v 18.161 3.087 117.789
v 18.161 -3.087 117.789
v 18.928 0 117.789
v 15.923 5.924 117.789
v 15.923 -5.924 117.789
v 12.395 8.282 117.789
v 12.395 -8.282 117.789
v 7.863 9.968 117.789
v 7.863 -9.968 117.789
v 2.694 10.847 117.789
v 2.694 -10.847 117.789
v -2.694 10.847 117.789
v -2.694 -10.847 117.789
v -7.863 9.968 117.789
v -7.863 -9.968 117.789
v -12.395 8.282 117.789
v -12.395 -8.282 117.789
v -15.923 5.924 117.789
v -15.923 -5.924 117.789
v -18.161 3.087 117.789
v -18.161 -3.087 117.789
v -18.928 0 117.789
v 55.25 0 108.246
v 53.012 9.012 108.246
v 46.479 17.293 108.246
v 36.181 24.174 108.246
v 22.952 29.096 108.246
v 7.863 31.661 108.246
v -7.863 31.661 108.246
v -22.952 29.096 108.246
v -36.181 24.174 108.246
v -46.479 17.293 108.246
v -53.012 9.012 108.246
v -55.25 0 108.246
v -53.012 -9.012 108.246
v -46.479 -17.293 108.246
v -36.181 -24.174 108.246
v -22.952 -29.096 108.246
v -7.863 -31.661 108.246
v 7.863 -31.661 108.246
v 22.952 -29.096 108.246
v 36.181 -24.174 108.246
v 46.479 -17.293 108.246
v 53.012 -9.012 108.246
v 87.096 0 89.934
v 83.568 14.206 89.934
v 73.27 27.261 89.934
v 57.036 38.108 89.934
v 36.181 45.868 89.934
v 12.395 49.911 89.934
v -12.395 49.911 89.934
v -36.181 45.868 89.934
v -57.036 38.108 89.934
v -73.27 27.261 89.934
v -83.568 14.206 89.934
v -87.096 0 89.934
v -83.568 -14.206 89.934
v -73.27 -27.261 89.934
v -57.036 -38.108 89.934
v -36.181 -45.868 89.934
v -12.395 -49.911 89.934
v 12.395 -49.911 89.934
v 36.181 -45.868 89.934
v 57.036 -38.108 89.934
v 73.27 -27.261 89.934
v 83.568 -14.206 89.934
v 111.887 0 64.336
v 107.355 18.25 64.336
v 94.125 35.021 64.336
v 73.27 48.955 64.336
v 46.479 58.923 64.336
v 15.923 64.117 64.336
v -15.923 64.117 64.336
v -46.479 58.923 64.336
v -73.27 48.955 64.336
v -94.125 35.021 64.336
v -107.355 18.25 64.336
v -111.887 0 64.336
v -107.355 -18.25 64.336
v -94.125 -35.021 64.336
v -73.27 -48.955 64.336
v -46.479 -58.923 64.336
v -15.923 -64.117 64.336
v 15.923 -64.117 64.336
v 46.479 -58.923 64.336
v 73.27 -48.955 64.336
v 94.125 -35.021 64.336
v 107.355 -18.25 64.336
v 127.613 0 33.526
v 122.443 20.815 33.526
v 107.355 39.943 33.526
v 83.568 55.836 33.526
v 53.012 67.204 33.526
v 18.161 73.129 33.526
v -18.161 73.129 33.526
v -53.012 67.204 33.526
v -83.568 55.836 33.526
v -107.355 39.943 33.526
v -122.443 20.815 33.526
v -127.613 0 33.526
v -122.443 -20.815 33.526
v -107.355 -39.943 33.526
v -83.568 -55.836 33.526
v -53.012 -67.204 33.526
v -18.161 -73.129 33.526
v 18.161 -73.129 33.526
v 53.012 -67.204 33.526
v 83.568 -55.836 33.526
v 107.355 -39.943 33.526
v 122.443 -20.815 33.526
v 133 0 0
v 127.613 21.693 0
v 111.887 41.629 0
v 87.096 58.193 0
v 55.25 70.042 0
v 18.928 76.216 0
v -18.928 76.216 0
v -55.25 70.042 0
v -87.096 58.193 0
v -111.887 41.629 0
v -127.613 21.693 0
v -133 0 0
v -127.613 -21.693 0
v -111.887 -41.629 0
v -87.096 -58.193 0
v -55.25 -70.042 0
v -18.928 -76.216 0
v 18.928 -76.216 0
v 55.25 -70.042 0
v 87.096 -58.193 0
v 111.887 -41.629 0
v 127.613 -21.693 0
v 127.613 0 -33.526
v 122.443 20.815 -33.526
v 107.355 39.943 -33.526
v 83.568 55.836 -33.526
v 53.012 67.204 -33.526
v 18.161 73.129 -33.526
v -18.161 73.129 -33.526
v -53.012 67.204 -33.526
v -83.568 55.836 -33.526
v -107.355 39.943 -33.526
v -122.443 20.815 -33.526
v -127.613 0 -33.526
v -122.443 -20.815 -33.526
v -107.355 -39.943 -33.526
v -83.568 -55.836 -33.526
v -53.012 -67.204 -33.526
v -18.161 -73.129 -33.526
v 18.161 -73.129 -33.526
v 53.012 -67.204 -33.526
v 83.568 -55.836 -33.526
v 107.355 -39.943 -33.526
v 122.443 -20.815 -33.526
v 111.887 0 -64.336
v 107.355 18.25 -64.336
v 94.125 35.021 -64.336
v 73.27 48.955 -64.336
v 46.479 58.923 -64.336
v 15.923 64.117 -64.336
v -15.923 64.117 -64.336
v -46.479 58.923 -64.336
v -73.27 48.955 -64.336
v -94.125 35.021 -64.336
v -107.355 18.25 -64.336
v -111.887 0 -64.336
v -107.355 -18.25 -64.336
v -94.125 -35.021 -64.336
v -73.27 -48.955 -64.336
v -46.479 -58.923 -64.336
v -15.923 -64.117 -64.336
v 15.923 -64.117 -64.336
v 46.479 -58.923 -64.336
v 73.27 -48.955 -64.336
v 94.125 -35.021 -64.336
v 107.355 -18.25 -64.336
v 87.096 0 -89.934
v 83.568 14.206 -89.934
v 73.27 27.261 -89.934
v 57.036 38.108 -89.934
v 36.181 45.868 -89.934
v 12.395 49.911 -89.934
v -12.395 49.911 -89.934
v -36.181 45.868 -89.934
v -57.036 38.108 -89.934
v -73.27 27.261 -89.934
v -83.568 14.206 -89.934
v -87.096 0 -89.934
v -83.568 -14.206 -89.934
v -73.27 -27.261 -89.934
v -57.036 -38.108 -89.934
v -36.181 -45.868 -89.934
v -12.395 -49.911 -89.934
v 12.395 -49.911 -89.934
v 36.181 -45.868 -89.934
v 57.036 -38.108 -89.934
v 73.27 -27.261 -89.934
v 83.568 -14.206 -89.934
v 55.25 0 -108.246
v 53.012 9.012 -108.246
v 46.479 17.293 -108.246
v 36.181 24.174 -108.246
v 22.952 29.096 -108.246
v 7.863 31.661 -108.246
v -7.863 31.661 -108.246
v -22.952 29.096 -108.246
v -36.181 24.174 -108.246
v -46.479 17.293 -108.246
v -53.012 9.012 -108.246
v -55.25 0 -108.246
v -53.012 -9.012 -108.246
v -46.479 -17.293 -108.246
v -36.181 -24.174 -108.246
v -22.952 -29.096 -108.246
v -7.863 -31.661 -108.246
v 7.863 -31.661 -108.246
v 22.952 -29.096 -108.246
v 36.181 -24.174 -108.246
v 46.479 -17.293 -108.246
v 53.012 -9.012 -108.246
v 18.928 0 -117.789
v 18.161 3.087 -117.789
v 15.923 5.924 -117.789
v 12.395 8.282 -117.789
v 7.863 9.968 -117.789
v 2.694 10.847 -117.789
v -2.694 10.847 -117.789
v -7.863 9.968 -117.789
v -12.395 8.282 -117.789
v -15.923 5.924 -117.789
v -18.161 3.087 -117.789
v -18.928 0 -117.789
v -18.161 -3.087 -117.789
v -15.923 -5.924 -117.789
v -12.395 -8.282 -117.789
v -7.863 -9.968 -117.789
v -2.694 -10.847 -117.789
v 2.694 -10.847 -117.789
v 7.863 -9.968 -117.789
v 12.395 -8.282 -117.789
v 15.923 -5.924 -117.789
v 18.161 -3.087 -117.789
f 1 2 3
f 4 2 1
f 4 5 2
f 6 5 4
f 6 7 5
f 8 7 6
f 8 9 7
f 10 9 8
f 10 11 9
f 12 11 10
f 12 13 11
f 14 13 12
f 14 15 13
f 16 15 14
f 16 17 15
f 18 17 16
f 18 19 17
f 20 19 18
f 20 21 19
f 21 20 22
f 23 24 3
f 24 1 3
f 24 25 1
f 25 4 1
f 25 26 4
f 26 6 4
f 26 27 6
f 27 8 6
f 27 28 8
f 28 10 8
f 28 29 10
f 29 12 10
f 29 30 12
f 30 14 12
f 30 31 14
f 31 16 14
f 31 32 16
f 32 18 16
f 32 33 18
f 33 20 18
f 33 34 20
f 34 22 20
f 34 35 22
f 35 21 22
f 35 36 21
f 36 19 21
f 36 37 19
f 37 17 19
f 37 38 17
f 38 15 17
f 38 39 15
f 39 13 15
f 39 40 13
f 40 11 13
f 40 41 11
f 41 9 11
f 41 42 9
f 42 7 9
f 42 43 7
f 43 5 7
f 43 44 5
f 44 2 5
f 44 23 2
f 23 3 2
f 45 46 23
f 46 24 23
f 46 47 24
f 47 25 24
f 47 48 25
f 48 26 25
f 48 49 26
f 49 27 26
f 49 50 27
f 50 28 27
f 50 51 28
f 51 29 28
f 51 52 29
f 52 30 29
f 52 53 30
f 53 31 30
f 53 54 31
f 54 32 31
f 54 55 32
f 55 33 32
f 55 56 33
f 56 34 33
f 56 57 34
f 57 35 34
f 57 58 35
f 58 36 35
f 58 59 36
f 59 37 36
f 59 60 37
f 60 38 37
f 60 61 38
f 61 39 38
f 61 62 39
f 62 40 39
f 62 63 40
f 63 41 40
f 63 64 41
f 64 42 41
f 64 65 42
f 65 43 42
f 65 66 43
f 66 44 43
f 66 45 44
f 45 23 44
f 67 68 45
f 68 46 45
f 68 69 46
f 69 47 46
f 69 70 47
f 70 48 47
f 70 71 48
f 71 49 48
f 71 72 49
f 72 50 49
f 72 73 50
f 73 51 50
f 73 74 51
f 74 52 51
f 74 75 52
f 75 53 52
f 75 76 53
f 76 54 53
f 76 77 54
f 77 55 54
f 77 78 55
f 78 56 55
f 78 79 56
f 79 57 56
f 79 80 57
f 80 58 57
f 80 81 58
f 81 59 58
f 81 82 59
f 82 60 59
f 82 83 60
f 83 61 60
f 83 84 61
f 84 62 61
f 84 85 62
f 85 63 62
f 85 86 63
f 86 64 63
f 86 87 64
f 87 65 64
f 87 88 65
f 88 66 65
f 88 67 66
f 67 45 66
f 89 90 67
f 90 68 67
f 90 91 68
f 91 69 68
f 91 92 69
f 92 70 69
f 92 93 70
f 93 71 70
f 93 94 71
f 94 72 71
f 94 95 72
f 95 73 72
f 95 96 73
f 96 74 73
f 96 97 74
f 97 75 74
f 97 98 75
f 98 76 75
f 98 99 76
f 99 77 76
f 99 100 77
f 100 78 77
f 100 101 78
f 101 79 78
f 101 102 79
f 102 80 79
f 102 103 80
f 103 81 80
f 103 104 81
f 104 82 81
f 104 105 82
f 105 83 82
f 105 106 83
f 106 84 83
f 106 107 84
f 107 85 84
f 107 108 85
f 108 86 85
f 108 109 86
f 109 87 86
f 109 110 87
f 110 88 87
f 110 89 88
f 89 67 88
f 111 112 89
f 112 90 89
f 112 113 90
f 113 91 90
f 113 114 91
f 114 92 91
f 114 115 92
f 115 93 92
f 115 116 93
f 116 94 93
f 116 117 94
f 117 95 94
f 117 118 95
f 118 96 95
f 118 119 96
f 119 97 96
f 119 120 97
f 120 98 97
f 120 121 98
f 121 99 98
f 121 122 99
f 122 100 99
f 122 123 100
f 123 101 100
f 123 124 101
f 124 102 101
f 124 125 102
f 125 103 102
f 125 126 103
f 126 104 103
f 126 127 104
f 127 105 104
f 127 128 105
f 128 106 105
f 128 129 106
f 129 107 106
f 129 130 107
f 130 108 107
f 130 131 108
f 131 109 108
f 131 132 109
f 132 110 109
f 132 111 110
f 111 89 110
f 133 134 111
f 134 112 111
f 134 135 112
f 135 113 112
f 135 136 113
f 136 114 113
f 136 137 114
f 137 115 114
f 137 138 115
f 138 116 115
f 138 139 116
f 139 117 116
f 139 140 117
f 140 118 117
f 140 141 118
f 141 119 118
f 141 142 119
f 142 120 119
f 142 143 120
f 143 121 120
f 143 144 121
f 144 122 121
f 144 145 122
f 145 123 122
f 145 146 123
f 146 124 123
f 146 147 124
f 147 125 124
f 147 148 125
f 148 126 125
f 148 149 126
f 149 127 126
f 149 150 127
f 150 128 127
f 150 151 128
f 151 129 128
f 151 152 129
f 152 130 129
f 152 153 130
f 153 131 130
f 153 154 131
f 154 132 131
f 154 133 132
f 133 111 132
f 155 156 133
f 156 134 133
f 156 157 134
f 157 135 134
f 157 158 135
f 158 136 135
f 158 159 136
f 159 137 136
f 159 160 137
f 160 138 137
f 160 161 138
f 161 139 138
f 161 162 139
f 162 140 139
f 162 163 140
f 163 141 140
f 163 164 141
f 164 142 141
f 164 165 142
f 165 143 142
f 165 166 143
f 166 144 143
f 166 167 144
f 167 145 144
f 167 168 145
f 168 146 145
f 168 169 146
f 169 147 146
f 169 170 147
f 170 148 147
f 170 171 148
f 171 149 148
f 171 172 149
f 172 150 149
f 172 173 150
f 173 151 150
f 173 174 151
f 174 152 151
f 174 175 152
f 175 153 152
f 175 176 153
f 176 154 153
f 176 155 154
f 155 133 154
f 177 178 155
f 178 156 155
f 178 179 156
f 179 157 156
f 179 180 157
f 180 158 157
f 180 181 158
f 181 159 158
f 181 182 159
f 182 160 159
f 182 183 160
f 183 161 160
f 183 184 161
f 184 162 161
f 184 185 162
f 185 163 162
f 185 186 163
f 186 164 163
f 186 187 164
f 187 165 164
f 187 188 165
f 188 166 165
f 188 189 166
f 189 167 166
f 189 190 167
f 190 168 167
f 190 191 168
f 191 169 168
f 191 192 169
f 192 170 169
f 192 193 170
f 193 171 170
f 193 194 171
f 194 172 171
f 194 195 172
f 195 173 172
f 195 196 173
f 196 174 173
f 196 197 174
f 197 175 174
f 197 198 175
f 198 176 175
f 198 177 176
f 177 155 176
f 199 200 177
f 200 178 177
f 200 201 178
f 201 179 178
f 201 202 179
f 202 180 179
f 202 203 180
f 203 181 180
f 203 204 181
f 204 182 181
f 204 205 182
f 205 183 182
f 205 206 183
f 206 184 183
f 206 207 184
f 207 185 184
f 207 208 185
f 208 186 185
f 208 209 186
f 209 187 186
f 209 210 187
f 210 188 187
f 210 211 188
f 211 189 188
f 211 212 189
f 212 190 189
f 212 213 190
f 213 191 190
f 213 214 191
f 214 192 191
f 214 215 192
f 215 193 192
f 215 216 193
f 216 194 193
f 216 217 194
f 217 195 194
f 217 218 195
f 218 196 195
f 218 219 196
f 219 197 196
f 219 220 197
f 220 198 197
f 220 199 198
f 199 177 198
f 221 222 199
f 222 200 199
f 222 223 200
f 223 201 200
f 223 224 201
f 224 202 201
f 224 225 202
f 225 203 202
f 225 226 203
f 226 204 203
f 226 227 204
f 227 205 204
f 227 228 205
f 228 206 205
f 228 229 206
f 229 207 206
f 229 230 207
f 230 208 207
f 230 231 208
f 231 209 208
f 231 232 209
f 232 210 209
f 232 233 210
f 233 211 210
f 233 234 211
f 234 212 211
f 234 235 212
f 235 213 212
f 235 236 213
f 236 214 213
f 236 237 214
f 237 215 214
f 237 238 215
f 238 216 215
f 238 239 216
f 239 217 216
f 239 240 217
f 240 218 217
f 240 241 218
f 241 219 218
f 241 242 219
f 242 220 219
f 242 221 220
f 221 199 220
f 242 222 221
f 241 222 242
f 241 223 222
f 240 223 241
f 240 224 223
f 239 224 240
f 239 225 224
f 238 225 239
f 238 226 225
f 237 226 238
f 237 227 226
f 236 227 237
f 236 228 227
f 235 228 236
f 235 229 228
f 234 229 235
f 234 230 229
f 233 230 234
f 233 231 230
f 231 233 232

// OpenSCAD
// Generated by SolidPython 1.0.1 on 2020-07-29 00:46:54


scale(v = [19, 11, 17]) {
	sphere(r = 7);
}
/***********************************************
*********      SolidPython code:      **********
************************************************
 
# import packages: SolidPython
from solid import *
from solid.utils import *
from itertools import chain, combinations, permutations


class Resize:

    def __init__(self, scad_file):
        self.scad_file = scad_file
        #self.scad_file = import_scad(scad_file)
        # cone/cylinder param:
        self.r1 = 0
        self.r2 = 0
        self.h = 0
        # rectangular prism param:
        self.w = 0
        self.l = 0
        # ellipse param:
        self.r = 0

    # import OpenScad code (file name corresponds to shape)


    # classify shape + parameters
    def assign(self, param1, param2, param3):
        if self.scad_file == 'cone.scad':
            self.r1 = param1
            self.r2 = param2
            self.h = param3
        elif self.scad_file == 'cylinder.scad':
            self.r1 = param1
            self.r2 = param2
            self.h = param3
        elif self.scad_file == 'rectangularPrism.scad':
            self.h = param1
            self.l = param2
            self.w = param3
        else:
            self.r = param1
            self.h = param2

    # resize parameters
    def iterate(self):
        x = range(3, 20, 2)
        i = 1
        if self.scad_file == 'cone.scad':
            tempList = list(permutations(x, 2))
            for temp in tempList:
                param1 = temp[0]
                param2 = temp[1]
                filepath = 'produced_scad_files/' + 'cone' + str(param1) + '_' + str(param2) + '_' + '.scad'
                scad_render_to_file(cylinder(h=param1, r1=param2, r2=0), filepath)

        elif self.scad_file == 'cylinder.scad':
            tempList = list(permutations(x, 3))
            for temp in tempList:
                param1 = temp[0]
                param2 = temp[1]
                filepath = 'produced_scad_files/' + 'cylinder' + str(param1) + '_' + str(param2) + '_' + '.scad'
                scad_render_to_file(cylinder(h=param1, r1=param2, r2=param2), filepath)

        elif self.scad_file == 'rectangularPrism.scad':
            tempList = list(permutations(x, 3))
            for temp in tempList:
                param1 = temp[0]
                param2 = temp[1]
                param3 = temp[2]
                filepath = 'produced_scad_files/' + 'rectangularPrism' + str(param1) + '_' + str(param2) + '_' + str(
                    param3) + '.scad'
                scad_render_to_file(cube(size=(param1, param2, param3)), filepath)

        elif self.scad_file == 'ellipse.scad':
            tempList = list(permutations(x, 4))
            for temp in tempList:
                param1 = temp[0]
                param2 = temp[1]
                param3 = temp[2]
                param4 = temp[3]
                filepath = 'produced_scad_files/' + 'ellipse' + str(param1) + '_' + str(param2) + '_' + str(param3) + '_' + str(param4) + '.scad'
                scad_render_to_file(scale([param1, param2, param3])(sphere(r=param4)), filepath)

    def render_to_scadfile(self):
        scad_render_to_file(scad, 'example.scad') 
 
************************************************/
